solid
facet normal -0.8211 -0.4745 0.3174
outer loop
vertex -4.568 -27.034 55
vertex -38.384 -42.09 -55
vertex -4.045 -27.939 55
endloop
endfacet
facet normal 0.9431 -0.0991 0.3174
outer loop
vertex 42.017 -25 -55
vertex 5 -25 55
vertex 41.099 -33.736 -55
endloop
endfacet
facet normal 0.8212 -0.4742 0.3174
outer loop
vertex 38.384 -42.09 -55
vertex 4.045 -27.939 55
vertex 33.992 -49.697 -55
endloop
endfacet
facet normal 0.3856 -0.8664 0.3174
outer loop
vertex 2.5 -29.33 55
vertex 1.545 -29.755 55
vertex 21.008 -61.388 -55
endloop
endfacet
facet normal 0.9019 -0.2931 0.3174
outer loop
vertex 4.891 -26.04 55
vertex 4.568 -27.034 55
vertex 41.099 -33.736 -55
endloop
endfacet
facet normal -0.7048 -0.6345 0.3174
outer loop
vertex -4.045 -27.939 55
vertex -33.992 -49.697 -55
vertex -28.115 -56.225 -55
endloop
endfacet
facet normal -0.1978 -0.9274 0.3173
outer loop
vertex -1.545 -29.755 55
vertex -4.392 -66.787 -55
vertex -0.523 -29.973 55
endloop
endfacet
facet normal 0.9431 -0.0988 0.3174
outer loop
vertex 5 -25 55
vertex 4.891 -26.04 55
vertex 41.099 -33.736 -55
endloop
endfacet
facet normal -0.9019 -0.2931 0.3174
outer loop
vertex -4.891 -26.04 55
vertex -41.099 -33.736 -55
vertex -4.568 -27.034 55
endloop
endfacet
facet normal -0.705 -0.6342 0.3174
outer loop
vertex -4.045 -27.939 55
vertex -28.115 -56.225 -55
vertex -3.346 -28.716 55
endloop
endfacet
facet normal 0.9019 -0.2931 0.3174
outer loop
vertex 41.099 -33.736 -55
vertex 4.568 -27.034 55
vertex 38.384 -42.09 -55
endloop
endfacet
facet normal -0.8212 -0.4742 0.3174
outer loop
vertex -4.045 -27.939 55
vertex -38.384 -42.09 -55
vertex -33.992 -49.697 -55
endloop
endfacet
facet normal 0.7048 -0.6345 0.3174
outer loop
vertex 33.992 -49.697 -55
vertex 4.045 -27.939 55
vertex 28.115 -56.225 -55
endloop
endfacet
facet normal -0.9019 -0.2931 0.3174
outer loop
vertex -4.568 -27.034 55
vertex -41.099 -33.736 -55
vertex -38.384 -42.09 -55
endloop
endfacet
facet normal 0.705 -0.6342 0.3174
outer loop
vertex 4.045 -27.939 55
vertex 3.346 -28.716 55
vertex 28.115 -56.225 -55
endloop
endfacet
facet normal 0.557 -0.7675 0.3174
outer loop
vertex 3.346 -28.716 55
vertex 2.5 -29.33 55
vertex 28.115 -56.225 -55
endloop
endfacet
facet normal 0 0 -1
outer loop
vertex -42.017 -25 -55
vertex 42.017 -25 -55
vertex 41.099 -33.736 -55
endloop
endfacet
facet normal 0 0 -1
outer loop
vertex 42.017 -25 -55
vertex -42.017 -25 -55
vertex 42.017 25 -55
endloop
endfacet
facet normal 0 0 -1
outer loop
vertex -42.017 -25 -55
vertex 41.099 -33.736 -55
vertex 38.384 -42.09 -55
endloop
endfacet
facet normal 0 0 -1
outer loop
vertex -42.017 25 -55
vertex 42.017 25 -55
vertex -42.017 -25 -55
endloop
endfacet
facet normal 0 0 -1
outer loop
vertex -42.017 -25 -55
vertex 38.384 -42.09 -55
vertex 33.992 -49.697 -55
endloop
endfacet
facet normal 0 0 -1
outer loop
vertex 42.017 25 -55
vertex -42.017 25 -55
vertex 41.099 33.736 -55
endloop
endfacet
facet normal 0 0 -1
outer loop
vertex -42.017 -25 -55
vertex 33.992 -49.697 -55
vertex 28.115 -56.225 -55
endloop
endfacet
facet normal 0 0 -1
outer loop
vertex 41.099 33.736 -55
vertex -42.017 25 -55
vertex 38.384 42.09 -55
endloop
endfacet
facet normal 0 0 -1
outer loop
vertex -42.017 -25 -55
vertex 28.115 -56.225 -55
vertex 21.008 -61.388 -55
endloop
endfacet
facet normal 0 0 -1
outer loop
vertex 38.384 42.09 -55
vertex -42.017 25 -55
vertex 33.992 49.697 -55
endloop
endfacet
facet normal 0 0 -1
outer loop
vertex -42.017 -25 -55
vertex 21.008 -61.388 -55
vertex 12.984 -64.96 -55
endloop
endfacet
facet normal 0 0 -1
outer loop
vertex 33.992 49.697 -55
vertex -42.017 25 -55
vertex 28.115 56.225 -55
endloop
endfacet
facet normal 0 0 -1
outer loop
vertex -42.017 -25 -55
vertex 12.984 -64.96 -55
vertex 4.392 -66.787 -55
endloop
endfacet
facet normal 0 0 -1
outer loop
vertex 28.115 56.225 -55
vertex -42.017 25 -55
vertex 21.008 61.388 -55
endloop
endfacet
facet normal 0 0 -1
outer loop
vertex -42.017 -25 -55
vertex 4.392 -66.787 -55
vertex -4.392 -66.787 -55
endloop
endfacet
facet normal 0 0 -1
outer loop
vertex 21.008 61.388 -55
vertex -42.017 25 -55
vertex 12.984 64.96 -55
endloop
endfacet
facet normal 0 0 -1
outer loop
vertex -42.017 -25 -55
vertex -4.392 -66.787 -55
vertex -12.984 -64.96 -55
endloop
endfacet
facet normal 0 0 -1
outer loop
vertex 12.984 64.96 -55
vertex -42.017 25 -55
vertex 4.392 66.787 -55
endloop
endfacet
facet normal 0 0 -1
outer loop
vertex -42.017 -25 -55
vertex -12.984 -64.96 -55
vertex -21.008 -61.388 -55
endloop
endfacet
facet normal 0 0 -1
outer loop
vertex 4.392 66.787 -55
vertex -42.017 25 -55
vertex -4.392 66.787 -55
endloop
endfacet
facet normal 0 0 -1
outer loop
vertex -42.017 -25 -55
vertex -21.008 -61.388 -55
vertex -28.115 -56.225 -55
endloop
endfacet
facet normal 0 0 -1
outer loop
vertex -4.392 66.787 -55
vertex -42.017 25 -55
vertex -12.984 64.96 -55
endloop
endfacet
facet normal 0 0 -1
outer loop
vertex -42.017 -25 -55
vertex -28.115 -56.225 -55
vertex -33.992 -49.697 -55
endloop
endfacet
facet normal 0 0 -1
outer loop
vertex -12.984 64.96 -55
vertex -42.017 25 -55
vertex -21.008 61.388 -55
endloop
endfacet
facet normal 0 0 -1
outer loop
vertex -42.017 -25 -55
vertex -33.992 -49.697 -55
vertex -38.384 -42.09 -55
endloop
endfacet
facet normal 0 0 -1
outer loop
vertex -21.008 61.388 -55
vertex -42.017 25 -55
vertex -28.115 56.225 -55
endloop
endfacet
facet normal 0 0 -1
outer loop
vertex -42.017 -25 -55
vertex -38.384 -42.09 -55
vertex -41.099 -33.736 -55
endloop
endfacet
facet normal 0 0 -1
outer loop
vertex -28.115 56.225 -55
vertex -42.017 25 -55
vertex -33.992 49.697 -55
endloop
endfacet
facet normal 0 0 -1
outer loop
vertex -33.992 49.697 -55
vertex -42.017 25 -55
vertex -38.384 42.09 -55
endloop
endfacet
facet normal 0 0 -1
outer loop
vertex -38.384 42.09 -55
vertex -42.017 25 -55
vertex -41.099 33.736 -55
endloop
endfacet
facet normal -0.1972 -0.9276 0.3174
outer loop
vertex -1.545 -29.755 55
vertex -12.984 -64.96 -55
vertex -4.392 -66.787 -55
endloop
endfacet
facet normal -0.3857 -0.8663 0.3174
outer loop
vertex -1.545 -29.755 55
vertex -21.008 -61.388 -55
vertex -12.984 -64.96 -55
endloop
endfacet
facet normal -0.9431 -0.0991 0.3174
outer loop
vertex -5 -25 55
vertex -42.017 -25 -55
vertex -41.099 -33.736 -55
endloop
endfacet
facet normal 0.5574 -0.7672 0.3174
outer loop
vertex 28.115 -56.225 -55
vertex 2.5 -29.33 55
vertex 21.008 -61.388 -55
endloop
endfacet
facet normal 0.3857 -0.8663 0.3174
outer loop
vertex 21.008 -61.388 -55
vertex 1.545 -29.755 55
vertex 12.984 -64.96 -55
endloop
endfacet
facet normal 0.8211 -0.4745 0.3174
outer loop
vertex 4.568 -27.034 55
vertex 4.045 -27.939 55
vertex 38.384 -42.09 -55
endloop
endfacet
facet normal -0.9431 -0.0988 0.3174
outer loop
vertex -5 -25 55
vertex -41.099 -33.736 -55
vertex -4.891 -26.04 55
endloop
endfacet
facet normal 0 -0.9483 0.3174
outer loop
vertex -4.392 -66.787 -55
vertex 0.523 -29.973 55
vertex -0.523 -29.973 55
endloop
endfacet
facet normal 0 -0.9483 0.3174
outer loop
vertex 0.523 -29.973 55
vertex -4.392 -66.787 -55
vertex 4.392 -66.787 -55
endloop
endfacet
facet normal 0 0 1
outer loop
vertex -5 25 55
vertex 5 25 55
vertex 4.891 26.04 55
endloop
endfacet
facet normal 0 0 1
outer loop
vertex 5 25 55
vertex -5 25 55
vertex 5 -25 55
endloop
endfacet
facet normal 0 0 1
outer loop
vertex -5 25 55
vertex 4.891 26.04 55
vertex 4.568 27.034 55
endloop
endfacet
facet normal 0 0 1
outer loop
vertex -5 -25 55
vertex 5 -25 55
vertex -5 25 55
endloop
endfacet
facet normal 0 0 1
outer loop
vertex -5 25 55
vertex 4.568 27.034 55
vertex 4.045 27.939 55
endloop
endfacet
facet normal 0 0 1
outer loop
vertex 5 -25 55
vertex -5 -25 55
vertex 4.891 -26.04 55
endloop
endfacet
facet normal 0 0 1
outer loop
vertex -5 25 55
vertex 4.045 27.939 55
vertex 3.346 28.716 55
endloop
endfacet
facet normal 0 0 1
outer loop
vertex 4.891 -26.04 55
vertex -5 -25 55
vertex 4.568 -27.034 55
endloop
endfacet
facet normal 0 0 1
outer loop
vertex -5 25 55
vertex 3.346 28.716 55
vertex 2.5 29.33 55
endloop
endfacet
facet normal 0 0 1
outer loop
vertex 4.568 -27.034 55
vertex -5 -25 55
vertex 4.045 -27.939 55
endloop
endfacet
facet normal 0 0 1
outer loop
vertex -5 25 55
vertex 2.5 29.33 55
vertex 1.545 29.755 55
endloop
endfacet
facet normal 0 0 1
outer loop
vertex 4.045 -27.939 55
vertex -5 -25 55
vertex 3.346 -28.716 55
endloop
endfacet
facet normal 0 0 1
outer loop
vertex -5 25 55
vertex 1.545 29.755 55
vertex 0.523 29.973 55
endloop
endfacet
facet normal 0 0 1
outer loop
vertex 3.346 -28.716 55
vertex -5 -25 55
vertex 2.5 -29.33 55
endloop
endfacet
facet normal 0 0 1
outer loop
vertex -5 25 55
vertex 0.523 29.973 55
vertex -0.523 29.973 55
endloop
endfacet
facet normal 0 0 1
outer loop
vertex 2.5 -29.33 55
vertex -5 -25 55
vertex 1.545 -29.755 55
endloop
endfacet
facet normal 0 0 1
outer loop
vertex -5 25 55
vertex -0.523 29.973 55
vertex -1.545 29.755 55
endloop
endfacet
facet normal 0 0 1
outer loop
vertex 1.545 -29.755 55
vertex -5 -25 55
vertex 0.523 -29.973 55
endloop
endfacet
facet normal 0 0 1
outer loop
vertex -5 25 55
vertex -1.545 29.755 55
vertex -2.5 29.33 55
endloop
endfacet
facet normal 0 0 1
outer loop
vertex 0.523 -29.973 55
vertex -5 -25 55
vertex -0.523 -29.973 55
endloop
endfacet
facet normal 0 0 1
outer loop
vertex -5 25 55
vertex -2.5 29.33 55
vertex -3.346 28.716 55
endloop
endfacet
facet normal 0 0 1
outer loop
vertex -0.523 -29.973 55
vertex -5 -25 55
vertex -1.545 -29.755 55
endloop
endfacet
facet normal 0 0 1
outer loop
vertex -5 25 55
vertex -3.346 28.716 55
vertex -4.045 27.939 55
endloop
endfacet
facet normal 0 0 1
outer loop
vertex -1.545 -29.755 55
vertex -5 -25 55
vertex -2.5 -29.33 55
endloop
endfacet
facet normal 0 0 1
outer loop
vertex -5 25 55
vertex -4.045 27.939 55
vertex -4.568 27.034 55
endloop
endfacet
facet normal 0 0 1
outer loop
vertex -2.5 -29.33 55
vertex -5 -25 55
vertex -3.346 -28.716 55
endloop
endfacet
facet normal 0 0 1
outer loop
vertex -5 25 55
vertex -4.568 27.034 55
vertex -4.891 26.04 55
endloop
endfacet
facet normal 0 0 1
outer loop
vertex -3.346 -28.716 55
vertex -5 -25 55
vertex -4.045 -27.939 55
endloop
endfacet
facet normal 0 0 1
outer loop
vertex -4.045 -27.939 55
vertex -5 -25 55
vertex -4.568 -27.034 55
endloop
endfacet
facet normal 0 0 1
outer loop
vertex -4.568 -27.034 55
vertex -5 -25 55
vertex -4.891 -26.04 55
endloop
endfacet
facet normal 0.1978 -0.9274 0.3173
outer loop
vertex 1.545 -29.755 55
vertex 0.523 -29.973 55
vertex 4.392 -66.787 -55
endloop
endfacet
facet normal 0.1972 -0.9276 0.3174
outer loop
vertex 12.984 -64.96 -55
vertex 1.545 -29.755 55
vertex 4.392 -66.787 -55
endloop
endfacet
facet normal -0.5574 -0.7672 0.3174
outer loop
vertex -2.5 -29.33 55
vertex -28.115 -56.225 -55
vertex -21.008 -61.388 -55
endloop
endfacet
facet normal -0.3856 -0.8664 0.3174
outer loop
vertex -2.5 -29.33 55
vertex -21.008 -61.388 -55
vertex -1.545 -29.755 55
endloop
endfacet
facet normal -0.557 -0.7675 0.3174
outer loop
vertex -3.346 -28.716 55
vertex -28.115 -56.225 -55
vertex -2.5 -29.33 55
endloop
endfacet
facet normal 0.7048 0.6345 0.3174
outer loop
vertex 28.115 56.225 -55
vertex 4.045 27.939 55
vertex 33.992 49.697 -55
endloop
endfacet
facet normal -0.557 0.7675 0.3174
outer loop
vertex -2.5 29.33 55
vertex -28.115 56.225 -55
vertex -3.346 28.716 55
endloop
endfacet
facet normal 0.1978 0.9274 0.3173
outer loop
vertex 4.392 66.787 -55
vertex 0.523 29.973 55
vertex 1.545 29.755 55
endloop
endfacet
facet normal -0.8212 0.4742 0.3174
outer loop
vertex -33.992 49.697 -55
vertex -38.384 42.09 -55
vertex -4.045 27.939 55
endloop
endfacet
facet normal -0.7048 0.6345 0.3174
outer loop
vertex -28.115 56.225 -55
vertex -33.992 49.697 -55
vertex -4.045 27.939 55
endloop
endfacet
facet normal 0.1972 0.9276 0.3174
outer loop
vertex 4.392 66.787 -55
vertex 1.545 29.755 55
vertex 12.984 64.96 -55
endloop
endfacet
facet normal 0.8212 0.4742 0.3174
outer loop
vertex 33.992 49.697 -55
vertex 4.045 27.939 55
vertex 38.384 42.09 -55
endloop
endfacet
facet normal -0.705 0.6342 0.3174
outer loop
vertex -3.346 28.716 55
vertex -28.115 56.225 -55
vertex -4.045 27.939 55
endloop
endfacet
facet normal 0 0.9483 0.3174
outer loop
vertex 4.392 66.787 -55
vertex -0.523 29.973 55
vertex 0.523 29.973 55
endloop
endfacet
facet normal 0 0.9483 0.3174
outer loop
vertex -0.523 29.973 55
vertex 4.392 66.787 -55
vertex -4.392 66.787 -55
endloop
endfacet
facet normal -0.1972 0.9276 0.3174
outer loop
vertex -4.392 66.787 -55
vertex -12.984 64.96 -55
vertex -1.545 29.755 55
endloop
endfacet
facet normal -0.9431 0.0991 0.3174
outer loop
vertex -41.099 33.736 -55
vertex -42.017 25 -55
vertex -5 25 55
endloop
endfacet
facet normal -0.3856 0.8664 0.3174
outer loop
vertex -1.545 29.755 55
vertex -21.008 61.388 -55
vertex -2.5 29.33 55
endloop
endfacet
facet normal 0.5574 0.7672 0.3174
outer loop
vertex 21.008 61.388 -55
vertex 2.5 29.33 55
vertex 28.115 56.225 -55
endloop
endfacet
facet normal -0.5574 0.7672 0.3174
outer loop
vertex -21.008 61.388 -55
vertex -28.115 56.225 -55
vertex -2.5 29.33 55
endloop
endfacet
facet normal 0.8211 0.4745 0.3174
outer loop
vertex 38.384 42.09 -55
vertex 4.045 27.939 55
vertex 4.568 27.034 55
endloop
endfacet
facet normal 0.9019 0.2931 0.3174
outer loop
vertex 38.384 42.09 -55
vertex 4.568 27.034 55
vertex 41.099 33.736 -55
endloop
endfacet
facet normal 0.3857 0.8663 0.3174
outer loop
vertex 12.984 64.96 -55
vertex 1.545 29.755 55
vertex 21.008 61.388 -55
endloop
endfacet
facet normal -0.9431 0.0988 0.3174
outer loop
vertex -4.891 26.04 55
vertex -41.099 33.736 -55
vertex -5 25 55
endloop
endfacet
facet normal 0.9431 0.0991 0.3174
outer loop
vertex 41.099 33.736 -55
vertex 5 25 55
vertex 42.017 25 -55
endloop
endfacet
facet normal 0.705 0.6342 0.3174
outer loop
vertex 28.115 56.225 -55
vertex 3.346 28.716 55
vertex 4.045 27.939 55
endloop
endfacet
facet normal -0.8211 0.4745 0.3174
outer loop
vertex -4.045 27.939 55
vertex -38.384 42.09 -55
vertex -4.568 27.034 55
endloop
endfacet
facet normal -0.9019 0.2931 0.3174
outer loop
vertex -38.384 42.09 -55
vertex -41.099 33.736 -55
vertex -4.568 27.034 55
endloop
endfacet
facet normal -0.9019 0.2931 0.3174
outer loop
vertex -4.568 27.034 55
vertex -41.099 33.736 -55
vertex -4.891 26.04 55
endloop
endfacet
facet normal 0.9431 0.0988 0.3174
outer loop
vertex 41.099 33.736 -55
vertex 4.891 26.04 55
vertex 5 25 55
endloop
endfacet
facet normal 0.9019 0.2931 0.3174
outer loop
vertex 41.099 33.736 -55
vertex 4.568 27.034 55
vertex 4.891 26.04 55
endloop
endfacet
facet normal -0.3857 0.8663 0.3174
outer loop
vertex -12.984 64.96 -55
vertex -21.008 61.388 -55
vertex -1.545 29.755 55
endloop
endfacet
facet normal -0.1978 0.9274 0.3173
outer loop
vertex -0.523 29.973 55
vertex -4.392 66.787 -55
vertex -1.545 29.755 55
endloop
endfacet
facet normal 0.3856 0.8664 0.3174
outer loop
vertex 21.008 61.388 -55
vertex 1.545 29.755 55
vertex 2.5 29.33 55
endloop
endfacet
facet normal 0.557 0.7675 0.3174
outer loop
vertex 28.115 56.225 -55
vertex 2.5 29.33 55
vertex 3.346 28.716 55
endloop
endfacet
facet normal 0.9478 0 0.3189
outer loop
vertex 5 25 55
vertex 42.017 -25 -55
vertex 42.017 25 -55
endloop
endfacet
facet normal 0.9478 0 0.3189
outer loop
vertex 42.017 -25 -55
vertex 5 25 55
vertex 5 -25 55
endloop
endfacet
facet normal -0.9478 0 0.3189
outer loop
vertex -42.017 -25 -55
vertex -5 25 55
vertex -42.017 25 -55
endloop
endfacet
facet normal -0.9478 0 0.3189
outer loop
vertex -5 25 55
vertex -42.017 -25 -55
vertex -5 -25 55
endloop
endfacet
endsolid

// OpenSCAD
// Start: lazy_union
default_5_default_5();
// End: lazy_union

// Modules.

// 'PartMaterial undef-default - default 5.0'
module default_5_default_5() {
  // 'None : _combine_solids_and_holes'
  union() {
    // 'default : _combine_solids_and_holes'
    union() {
      // 'cage'
      %multmatrix(m=[[1.0, 0.0, 0.0, -42.01690497626037], [0.0, 1.0, 0.0, -67.01690497626038], [0.0, 0.0, 1.0, -55.0], [0.0, 0.0, 0.0, 1.0]]) {
        // 'cage'
        color(c=[0.0, 1.0, 0.35, 0.4]) {
          // 'cage : _combine_solids_and_holes'
          union() {
            // 'cage'
            cube(size=[84.03380995252074, 134.03380995252076, 110.0]);
          }
        }
      }
      // 'cone1'
      multmatrix(m=[[1.0, 0.0, 0.0, 0.0], [0.0, 1.0, 0.0, -25.0], [0.0, 0.0, 1.0, -55.0], [0.0, 0.0, 0.0, 1.0]]) {
        // 'cone1 : _combine_solids_and_holes'
        union() {
          // 'cone1'
          cylinder(h=110.0, r1=42.01690497626037, r2=5.0, center=false);
        }
      }
      // 'cone2'
      multmatrix(m=[[-1.0, 0.0, 0.0, 0.0], [0.0, -1.0, 0.0, 25.0], [0.0, 0.0, 1.0, -55.0], [0.0, 0.0, 0.0, 1.0]]) {
        // 'cone2 : _combine_solids_and_holes'
        union() {
          // 'cone2'
          cylinder(h=110.0, r1=42.01690497626037, r2=5.0, center=false);
        }
      }
      // 'prism'
      multmatrix(m=[[-1.0, 0.0, 0.0, 0.0], [0.0, 0.0, 1.0, -25.0], [0.0, 1.0, 0.0, -55.0], [0.0, 0.0, 0.0, 1.0]]) {
        // 'prism : _combine_solids_and_holes'
        union() {
          // 'prism'
          linear_extrude(height=50.0, twist=0.0, slices=4, scale=[1.0, 1.0]) {
            polygon(points=[[0.0, 0.0], [-42.01690497626037, 0.0], [-5.0, 110.0], [5.0, 110.0], [42.01690497626037, 0.0]]);
          }
        }
      }
    }
  }
} // end module default_5_default_5
